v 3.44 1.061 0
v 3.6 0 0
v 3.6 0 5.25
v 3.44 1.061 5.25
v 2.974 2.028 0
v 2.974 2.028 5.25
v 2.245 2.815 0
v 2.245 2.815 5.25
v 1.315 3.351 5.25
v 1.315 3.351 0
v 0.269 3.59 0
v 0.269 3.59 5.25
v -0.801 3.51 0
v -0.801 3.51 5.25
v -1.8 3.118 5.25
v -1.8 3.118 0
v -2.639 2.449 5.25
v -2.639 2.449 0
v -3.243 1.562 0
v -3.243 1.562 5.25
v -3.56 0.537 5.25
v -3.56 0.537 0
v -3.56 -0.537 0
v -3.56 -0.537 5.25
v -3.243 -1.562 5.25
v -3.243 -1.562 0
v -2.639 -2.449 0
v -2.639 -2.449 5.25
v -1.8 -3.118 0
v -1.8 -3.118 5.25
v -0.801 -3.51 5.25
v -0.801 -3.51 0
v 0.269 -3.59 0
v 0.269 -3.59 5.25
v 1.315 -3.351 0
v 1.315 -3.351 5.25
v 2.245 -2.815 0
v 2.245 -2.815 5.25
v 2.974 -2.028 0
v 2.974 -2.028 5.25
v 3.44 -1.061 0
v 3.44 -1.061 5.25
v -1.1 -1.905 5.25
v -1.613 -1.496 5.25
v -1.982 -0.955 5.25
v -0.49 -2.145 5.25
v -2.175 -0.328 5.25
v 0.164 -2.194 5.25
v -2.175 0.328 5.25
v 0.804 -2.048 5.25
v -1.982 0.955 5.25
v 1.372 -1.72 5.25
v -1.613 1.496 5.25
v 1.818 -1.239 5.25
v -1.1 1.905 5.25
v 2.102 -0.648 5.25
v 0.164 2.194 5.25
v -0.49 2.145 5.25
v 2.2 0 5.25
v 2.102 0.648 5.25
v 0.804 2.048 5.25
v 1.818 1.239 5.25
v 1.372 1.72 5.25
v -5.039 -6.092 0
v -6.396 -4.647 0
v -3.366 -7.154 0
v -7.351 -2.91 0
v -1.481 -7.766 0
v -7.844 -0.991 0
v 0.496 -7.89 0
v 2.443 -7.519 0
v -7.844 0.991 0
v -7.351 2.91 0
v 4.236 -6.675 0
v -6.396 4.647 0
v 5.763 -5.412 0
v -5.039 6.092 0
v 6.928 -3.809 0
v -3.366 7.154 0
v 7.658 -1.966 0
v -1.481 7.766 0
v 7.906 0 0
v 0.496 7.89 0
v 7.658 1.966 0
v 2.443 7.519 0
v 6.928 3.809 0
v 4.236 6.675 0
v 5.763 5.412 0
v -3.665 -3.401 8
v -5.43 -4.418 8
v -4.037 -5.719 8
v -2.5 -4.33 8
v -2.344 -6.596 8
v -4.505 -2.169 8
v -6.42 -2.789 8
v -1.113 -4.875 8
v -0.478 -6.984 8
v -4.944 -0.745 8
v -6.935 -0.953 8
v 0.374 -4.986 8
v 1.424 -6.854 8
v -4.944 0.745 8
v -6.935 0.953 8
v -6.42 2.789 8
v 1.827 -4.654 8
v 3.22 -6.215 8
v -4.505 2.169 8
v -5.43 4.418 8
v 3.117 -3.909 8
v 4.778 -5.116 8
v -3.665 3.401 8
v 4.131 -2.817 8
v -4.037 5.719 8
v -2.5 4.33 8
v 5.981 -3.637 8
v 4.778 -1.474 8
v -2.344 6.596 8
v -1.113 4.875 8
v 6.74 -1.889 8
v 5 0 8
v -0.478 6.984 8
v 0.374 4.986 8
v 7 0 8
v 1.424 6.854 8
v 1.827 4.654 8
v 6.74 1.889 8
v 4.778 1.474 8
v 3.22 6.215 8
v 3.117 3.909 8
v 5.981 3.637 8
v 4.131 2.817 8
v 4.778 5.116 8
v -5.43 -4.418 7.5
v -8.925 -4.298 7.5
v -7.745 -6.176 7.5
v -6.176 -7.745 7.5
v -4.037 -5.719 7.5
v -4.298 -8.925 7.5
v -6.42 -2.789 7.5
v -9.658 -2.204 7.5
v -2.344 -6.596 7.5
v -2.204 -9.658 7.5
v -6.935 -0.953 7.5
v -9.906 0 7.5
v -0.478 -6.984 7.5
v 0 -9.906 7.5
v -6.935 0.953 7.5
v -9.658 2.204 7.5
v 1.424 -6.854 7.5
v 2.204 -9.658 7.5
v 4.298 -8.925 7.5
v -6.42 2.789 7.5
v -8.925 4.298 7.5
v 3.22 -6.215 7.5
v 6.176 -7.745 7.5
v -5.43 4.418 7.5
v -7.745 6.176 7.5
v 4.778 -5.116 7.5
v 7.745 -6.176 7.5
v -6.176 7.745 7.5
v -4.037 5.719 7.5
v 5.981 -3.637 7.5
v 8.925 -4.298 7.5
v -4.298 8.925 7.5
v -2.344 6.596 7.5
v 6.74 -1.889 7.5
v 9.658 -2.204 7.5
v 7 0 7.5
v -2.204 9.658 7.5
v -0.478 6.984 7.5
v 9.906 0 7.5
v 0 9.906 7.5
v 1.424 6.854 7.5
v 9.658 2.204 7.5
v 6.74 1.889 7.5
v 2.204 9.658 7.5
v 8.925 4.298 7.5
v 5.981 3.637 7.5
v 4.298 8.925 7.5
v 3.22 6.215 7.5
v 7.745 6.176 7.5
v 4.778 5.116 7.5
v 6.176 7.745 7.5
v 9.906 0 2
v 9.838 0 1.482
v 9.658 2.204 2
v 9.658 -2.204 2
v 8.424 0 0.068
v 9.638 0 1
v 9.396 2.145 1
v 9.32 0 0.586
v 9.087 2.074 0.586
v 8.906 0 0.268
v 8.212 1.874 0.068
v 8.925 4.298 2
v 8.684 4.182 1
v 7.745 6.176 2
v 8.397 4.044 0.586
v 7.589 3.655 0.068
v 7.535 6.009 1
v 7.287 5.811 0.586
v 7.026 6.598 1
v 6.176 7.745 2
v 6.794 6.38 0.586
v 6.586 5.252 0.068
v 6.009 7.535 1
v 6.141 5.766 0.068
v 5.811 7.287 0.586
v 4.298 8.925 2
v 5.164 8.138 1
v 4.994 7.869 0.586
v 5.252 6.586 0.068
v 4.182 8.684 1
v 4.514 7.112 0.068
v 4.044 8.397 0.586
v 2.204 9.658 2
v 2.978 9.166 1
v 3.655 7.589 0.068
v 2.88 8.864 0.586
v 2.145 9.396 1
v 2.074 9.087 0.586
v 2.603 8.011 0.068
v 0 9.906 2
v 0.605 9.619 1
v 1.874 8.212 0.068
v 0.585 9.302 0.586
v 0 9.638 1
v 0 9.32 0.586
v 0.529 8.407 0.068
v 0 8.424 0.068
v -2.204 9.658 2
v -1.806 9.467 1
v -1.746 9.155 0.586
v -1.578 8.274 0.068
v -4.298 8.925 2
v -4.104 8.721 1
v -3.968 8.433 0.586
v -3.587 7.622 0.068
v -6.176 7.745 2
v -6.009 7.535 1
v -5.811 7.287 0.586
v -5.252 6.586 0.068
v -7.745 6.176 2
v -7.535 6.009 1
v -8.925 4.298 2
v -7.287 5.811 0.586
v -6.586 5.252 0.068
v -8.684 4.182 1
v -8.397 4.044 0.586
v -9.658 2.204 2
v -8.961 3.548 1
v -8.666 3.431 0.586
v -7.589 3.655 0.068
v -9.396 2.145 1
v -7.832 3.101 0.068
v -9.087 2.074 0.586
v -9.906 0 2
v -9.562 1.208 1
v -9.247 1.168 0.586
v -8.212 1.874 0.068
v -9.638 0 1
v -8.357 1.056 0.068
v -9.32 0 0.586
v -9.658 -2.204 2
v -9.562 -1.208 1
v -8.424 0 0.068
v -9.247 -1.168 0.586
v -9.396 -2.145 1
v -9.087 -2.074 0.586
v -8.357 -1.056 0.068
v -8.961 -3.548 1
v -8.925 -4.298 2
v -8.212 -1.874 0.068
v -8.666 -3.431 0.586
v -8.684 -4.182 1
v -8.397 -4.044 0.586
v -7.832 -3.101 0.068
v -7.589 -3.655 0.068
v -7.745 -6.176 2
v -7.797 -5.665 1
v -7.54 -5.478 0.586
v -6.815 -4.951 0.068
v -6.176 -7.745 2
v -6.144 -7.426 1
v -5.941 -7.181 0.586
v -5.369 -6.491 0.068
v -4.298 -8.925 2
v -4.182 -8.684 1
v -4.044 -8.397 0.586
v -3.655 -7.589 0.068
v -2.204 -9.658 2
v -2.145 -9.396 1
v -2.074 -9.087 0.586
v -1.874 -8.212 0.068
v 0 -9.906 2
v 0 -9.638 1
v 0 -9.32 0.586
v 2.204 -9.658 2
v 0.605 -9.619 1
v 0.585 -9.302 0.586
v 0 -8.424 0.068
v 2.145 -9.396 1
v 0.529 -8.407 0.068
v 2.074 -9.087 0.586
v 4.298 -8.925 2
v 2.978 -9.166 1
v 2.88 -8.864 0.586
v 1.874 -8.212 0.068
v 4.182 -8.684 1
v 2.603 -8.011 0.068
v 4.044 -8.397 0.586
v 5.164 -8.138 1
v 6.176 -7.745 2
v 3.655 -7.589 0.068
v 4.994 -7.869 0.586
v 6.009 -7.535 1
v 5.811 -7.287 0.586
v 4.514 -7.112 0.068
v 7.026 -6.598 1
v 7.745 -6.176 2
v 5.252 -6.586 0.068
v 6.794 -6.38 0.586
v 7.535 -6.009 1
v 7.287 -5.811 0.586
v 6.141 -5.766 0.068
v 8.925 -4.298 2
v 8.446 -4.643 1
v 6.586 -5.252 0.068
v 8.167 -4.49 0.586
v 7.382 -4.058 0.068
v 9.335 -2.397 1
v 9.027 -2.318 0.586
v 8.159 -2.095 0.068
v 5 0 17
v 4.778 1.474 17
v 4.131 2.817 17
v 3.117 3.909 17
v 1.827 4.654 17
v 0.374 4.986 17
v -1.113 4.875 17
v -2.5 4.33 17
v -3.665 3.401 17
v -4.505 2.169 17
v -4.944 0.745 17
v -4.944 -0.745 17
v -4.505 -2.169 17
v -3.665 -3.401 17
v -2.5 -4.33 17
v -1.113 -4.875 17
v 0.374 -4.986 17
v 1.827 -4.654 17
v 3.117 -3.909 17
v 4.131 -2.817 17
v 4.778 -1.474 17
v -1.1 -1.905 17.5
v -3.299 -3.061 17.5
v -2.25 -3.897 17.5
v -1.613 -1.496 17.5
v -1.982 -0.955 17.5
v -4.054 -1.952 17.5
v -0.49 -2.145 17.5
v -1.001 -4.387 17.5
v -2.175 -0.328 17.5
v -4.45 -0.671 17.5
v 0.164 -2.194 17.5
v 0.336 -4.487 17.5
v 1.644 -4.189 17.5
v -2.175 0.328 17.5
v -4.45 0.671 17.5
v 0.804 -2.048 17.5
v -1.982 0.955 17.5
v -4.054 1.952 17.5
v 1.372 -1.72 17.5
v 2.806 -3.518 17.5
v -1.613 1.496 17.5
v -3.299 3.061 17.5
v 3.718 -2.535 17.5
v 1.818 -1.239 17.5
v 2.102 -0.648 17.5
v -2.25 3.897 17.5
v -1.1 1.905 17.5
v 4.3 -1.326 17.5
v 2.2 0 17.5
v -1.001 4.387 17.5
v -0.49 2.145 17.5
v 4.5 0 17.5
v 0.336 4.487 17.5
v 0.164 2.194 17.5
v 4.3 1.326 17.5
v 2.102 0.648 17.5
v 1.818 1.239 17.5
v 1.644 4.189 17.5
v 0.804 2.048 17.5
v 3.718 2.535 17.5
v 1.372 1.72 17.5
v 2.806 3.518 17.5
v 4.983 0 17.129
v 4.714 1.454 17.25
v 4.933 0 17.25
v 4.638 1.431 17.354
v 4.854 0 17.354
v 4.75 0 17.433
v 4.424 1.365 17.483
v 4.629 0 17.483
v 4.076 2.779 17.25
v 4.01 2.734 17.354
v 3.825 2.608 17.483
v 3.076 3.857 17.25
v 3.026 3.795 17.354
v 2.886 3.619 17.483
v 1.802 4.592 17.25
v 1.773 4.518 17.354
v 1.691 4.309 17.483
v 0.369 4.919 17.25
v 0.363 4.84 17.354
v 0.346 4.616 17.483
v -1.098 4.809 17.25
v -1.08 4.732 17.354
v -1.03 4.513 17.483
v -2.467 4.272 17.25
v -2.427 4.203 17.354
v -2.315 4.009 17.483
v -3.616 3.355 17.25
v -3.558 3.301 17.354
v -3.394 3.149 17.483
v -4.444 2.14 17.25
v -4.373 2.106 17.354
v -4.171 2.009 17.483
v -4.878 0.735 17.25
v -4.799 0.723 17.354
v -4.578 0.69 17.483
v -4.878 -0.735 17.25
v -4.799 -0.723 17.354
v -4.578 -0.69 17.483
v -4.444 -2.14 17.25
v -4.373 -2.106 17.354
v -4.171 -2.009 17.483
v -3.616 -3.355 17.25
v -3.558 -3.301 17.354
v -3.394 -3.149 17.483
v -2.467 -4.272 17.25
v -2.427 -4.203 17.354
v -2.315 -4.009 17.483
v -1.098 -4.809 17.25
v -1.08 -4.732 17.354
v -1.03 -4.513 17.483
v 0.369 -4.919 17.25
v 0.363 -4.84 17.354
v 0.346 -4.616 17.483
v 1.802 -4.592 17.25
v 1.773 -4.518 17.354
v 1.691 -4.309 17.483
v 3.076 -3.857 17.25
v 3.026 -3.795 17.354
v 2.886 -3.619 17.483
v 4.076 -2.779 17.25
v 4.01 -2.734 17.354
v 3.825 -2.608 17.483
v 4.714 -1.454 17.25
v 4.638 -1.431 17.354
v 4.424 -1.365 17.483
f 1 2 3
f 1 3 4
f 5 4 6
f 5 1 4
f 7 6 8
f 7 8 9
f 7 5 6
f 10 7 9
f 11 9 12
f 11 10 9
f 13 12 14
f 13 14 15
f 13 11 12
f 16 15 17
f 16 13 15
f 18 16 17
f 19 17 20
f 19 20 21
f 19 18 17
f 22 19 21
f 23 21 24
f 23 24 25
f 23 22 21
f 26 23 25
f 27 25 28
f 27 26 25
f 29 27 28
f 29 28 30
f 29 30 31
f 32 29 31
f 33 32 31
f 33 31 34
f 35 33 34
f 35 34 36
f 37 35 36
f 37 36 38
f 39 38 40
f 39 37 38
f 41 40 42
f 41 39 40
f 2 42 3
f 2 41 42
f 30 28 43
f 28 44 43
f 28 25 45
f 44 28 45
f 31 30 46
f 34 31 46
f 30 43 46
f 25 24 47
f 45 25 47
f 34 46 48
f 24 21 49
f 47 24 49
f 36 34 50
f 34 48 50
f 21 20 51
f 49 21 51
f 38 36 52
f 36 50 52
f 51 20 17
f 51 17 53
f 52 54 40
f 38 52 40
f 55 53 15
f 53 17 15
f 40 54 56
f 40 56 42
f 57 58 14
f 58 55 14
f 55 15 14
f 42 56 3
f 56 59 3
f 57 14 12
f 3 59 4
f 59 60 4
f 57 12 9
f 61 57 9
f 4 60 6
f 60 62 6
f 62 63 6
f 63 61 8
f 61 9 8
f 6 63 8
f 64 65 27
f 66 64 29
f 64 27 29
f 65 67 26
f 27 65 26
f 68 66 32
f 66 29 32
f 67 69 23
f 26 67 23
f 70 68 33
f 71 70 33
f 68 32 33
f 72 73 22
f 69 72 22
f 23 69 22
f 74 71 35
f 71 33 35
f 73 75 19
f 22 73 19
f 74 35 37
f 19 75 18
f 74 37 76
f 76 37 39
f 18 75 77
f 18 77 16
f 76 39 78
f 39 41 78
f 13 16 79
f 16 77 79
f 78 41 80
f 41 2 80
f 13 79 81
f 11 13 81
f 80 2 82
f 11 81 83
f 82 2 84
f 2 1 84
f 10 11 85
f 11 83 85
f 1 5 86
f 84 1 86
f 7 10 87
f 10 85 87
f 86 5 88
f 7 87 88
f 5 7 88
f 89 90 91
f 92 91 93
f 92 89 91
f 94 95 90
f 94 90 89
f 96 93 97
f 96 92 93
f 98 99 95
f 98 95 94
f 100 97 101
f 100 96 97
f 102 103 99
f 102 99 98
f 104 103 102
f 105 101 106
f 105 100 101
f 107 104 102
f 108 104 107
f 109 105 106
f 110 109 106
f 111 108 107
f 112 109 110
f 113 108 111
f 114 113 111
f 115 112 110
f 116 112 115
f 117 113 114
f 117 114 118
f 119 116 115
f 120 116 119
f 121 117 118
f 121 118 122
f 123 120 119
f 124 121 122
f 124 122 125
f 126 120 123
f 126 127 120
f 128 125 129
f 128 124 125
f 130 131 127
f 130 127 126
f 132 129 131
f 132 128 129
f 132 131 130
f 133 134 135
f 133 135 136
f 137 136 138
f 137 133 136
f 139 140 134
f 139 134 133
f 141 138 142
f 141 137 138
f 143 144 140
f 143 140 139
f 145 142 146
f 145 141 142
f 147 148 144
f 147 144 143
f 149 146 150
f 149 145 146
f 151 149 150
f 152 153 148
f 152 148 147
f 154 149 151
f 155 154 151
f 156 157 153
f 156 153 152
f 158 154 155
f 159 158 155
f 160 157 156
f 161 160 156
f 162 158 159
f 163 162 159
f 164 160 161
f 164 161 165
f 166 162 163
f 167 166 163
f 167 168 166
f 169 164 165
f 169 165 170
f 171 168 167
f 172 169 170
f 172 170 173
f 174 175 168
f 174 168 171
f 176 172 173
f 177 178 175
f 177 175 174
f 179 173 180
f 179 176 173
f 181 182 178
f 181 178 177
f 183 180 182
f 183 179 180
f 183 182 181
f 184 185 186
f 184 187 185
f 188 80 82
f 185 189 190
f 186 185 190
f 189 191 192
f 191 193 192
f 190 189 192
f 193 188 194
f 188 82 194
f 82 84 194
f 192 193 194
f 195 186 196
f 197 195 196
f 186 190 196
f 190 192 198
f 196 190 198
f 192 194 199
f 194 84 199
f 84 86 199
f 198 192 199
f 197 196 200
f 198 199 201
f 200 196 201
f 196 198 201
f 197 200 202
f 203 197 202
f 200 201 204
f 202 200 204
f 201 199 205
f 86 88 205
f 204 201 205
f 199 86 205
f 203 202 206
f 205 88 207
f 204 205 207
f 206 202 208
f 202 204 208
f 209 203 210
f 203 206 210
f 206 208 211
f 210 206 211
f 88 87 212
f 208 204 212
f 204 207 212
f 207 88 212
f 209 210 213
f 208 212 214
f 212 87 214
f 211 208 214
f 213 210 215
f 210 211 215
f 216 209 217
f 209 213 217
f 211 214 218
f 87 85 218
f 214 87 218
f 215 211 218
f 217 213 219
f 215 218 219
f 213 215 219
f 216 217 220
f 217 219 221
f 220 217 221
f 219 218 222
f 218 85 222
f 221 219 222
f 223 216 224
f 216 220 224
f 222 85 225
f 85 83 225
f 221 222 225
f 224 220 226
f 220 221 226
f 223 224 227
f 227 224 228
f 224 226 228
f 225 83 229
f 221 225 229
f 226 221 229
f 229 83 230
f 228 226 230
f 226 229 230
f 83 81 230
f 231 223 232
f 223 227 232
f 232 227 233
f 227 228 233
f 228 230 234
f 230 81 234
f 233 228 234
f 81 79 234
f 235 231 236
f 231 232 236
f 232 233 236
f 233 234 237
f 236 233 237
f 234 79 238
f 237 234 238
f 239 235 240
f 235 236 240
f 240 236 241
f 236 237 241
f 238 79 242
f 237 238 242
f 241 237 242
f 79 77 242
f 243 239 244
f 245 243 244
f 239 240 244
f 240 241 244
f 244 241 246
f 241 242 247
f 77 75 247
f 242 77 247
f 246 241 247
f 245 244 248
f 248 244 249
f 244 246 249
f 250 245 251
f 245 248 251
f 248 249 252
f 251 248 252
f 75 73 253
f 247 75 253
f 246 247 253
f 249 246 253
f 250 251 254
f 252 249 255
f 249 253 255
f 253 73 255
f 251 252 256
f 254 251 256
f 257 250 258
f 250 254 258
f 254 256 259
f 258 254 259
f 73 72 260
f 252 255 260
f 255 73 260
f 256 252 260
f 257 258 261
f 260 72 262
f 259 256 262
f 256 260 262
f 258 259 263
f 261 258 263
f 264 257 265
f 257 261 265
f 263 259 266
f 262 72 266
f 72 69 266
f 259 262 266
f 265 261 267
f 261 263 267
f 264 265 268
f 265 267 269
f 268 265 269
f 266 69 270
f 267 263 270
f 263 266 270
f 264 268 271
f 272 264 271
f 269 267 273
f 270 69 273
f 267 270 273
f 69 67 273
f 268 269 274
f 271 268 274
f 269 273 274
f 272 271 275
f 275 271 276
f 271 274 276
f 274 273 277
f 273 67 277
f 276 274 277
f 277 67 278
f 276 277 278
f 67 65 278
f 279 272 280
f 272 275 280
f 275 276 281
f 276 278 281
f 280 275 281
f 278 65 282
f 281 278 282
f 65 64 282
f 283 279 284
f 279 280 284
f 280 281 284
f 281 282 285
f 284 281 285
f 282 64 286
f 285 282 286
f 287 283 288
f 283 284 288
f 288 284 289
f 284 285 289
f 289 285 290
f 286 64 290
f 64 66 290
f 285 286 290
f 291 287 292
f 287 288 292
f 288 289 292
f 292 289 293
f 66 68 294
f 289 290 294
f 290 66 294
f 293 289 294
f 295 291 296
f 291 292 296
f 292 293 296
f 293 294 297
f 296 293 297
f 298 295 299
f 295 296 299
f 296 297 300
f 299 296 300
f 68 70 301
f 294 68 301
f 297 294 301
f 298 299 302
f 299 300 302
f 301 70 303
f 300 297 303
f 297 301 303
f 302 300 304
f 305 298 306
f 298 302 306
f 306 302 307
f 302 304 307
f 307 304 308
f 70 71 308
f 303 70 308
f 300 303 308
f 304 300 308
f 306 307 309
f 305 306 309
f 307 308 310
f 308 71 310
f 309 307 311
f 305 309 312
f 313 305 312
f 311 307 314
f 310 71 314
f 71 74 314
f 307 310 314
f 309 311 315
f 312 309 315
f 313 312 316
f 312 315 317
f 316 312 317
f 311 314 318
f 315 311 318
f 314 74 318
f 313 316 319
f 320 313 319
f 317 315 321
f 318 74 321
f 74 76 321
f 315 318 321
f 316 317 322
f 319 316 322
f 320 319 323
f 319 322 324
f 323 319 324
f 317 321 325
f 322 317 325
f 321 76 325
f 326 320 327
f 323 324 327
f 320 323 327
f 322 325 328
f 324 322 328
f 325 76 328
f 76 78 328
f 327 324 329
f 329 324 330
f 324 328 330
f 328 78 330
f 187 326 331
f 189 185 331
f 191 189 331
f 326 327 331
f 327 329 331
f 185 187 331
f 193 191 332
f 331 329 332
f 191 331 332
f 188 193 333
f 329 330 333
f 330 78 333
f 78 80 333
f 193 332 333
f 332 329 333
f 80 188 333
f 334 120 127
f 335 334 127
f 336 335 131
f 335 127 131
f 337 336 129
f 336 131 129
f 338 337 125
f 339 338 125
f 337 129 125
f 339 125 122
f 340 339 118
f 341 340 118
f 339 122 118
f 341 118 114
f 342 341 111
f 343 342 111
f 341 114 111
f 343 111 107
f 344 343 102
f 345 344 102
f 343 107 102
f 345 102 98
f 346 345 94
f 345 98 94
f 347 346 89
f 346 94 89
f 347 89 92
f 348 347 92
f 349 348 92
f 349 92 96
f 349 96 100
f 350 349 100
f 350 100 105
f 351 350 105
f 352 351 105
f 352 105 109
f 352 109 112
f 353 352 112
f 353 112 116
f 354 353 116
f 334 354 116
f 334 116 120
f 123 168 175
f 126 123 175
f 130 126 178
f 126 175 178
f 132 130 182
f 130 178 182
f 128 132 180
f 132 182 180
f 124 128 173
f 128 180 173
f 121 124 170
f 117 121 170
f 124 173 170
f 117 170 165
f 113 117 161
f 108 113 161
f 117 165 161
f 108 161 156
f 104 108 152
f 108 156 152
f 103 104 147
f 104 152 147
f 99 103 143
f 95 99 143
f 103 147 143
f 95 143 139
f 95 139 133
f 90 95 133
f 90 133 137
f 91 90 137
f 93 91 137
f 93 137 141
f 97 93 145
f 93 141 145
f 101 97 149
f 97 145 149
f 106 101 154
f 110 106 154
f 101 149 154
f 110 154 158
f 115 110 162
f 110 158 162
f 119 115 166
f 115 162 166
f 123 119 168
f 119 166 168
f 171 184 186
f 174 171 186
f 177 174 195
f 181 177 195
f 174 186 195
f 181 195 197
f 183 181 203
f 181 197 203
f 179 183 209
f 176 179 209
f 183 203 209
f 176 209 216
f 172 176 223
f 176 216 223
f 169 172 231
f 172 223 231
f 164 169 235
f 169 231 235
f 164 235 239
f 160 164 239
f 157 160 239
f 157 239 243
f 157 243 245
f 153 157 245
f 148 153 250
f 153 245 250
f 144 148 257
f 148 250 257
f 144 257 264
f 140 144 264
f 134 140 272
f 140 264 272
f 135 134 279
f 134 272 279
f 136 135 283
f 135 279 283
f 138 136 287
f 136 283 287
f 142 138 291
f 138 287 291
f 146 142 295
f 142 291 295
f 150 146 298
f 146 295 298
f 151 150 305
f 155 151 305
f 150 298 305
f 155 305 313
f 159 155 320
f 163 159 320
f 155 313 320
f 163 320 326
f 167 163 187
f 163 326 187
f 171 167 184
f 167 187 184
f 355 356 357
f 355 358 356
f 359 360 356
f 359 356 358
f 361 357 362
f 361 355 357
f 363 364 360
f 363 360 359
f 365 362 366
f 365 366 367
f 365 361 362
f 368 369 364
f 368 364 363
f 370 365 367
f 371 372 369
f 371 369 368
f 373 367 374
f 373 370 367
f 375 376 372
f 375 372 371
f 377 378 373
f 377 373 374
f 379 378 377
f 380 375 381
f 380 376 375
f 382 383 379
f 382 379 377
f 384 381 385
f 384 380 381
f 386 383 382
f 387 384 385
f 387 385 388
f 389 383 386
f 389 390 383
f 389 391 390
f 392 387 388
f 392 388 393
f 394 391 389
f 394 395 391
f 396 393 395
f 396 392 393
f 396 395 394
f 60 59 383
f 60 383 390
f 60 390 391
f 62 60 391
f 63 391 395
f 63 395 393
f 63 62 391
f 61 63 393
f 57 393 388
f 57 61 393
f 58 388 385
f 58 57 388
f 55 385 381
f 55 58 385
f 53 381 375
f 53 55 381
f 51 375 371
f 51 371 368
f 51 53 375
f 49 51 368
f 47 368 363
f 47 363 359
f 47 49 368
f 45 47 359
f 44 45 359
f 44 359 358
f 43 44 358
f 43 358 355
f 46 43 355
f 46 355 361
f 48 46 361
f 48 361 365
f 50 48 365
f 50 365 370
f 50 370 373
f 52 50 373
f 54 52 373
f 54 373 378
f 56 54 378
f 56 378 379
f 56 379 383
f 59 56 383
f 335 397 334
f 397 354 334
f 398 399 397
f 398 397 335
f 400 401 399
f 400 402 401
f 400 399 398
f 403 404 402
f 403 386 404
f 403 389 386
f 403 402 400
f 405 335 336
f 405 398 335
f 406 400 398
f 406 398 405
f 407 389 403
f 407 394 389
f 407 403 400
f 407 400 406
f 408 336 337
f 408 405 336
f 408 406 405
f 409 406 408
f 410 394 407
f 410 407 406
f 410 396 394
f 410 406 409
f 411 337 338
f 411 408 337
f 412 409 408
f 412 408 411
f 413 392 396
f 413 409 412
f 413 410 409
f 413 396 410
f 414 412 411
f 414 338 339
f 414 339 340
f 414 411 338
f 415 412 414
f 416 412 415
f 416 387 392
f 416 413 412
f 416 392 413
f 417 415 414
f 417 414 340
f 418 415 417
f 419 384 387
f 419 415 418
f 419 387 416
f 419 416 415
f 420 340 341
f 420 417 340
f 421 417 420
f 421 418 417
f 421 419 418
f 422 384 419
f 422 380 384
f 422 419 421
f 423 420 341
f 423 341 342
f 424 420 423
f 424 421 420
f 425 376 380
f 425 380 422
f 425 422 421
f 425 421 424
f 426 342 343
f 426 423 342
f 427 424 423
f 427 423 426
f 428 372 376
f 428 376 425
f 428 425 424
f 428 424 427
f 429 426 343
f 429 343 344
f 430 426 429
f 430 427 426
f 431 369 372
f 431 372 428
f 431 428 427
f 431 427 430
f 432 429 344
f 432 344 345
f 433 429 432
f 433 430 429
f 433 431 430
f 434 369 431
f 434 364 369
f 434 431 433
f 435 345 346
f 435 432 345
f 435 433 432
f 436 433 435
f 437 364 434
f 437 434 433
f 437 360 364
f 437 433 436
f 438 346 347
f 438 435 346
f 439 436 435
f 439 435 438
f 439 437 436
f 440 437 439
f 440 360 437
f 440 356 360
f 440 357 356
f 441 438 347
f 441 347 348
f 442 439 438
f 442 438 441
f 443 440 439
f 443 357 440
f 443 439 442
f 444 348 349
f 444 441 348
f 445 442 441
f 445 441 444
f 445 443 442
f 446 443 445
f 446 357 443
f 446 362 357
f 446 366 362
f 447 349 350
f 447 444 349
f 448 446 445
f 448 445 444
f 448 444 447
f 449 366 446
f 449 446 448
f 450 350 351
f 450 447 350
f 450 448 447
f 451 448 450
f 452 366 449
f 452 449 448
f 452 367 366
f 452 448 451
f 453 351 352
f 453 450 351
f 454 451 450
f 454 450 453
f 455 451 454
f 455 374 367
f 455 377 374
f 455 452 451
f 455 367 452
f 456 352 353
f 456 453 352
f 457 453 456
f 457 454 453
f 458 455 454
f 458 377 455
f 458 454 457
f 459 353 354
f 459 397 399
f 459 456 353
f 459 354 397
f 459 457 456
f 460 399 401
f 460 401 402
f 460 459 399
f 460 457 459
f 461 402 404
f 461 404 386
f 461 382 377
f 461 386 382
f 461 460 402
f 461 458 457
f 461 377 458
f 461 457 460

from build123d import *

# Parameters (mm, degrees)
F0_R     = 5
F0_R_2   = 3.6
F0_R_3   = 2.2
F1_DEPTH = 17.5
F0_R_4   = 9.906
F2_DEPTH = 7.5
F3_DEPTH = 5.25
F4_R     = 2
F5_R     = 0.5
F6_R     = 7
F6_R_2   = 5
F7_DEPTH = 0.5


with BuildPart() as f1:
    # F0 (on Top) → F1 (new body)
    with BuildSketch(Plane.XY):
        Circle(F0_R)
        Circle(F0_R_2, mode=Mode.SUBTRACT)
        Circle(F0_R_2)
        Circle(F0_R_3, mode=Mode.SUBTRACT)
    extrude(amount=F1_DEPTH)

    # F0 (on Top) → F2 (join)
    with BuildSketch(Plane.XY):
        Circle(F0_R_4)
        Circle(F0_R, mode=Mode.SUBTRACT)
    extrude(amount=F2_DEPTH)

    # F0 (on Top) → F3 (cut)
    with BuildSketch(Plane.XY):
        Circle(F0_R_2)
        Circle(F0_R_3, mode=Mode.SUBTRACT)
    extrude(amount=F3_DEPTH, mode=Mode.SUBTRACT)

    # F4
    f4_edges = [f1.edges().sort_by_distance(p)[0] for p in [
        (-9.906, 0, 0),
    ]]
    fillet(f4_edges, radius=F4_R)

    # F5
    f5_edges = [f1.edges().sort_by_distance(p)[0] for p in [
        (-5, 0, 17.5),
    ]]
    fillet(f5_edges, radius=F5_R)

    # F6 (on face) → F7 (join)
    with BuildSketch(Plane.XY.offset(7.5)):
        Circle(F6_R)
        Circle(F6_R_2, mode=Mode.SUBTRACT)
    extrude(amount=F7_DEPTH)


solid = f1.part
